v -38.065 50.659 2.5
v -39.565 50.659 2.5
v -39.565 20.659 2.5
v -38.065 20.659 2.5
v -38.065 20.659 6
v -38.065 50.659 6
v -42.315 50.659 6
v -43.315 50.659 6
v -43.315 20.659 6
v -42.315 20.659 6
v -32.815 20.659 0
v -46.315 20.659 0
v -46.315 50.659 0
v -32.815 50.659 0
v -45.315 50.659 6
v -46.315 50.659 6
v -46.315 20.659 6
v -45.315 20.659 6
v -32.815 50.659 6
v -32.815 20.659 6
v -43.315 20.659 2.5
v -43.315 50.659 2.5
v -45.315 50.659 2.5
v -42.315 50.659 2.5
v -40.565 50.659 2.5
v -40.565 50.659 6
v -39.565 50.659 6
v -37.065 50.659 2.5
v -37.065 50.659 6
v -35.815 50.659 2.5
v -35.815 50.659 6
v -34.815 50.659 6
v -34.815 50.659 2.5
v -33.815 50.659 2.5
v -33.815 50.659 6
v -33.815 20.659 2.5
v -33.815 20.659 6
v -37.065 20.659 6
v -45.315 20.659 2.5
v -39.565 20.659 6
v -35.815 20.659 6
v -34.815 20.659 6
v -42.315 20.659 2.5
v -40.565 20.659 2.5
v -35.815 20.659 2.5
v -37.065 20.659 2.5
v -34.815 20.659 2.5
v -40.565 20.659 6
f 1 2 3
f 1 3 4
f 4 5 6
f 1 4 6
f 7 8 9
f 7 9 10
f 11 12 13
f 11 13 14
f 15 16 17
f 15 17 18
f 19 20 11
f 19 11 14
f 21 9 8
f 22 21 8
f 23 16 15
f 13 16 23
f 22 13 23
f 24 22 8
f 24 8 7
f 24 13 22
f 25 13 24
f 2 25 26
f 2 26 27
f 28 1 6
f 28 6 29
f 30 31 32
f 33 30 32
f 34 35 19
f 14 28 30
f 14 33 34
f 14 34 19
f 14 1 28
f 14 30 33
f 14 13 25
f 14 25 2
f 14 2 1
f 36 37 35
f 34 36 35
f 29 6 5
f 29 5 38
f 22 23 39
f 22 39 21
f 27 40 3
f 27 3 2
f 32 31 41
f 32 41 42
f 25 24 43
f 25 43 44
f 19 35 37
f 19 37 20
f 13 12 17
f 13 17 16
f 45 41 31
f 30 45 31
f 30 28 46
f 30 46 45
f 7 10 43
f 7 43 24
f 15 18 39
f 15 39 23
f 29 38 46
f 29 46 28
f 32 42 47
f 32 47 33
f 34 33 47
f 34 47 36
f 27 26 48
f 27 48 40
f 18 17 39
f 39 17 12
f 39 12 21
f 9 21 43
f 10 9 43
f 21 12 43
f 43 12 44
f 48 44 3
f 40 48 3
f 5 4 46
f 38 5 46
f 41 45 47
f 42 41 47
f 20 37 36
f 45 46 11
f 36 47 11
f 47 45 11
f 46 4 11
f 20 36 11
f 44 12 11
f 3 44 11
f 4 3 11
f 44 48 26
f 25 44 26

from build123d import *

# Parameters (mm, degrees)
F0_W     = 100
F0_H     = 100
F1_DEPTH = 6
F2_W     = 2
F2_H     = 100
F2_W_2   = 1.75
F2_W_3   = 1.5
F2_W_4   = 1.25
F2_W_5   = 1
F3_DEPTH = 3.5
F4_W     = 86.5
F4_H     = 100
F5_DEPTH = 25
F6_W     = 13.5
F6_H     = 70
F7_DEPTH = 25


with BuildPart() as f1:
    # F0 (on Top) → F1 (new body)
    with BuildSketch(Plane.XY):
        with Locations((3.685346, 0.65935)):
            Rectangle(F0_W, F0_H)
    extrude(amount=F1_DEPTH)

    # F2 (on face) → F3 (cut)
    with BuildSketch(Plane.XY.offset(6)):
        with Locations((-44.314654, 0.65935)):
            Rectangle(F2_W, F2_H)
        with Locations((-41.439654, 0.65935)):
            Rectangle(F2_W_2, F2_H)
        with Locations((-38.814654, 0.65935)):
            Rectangle(F2_W_3, F2_H)
        with Locations((-36.439654, 0.65935)):
            Rectangle(F2_W_4, F2_H)
        with Locations((-34.314654, 0.65935)):
            Rectangle(F2_W_5, F2_H)
    extrude(amount=-F3_DEPTH, mode=Mode.SUBTRACT)

    # F4 (on face) → F5 (cut)
    with BuildSketch(Plane.XY.offset(6)):
        with Locations((10.435346, 0.65935)):
            Rectangle(F4_W, F4_H)
    extrude(amount=-F5_DEPTH, mode=Mode.SUBTRACT)

    # F6 (on face) → F7 (cut)
    with BuildSketch(Plane(origin=(0, 0, 0), x_dir=(1, 0, 0), z_dir=(0, 0, -1))):
        with Locations((-39.564654, 14.34065)):
            Rectangle(F6_W, F6_H)
    extrude(amount=-F7_DEPTH, mode=Mode.SUBTRACT)


solid = f1.part
